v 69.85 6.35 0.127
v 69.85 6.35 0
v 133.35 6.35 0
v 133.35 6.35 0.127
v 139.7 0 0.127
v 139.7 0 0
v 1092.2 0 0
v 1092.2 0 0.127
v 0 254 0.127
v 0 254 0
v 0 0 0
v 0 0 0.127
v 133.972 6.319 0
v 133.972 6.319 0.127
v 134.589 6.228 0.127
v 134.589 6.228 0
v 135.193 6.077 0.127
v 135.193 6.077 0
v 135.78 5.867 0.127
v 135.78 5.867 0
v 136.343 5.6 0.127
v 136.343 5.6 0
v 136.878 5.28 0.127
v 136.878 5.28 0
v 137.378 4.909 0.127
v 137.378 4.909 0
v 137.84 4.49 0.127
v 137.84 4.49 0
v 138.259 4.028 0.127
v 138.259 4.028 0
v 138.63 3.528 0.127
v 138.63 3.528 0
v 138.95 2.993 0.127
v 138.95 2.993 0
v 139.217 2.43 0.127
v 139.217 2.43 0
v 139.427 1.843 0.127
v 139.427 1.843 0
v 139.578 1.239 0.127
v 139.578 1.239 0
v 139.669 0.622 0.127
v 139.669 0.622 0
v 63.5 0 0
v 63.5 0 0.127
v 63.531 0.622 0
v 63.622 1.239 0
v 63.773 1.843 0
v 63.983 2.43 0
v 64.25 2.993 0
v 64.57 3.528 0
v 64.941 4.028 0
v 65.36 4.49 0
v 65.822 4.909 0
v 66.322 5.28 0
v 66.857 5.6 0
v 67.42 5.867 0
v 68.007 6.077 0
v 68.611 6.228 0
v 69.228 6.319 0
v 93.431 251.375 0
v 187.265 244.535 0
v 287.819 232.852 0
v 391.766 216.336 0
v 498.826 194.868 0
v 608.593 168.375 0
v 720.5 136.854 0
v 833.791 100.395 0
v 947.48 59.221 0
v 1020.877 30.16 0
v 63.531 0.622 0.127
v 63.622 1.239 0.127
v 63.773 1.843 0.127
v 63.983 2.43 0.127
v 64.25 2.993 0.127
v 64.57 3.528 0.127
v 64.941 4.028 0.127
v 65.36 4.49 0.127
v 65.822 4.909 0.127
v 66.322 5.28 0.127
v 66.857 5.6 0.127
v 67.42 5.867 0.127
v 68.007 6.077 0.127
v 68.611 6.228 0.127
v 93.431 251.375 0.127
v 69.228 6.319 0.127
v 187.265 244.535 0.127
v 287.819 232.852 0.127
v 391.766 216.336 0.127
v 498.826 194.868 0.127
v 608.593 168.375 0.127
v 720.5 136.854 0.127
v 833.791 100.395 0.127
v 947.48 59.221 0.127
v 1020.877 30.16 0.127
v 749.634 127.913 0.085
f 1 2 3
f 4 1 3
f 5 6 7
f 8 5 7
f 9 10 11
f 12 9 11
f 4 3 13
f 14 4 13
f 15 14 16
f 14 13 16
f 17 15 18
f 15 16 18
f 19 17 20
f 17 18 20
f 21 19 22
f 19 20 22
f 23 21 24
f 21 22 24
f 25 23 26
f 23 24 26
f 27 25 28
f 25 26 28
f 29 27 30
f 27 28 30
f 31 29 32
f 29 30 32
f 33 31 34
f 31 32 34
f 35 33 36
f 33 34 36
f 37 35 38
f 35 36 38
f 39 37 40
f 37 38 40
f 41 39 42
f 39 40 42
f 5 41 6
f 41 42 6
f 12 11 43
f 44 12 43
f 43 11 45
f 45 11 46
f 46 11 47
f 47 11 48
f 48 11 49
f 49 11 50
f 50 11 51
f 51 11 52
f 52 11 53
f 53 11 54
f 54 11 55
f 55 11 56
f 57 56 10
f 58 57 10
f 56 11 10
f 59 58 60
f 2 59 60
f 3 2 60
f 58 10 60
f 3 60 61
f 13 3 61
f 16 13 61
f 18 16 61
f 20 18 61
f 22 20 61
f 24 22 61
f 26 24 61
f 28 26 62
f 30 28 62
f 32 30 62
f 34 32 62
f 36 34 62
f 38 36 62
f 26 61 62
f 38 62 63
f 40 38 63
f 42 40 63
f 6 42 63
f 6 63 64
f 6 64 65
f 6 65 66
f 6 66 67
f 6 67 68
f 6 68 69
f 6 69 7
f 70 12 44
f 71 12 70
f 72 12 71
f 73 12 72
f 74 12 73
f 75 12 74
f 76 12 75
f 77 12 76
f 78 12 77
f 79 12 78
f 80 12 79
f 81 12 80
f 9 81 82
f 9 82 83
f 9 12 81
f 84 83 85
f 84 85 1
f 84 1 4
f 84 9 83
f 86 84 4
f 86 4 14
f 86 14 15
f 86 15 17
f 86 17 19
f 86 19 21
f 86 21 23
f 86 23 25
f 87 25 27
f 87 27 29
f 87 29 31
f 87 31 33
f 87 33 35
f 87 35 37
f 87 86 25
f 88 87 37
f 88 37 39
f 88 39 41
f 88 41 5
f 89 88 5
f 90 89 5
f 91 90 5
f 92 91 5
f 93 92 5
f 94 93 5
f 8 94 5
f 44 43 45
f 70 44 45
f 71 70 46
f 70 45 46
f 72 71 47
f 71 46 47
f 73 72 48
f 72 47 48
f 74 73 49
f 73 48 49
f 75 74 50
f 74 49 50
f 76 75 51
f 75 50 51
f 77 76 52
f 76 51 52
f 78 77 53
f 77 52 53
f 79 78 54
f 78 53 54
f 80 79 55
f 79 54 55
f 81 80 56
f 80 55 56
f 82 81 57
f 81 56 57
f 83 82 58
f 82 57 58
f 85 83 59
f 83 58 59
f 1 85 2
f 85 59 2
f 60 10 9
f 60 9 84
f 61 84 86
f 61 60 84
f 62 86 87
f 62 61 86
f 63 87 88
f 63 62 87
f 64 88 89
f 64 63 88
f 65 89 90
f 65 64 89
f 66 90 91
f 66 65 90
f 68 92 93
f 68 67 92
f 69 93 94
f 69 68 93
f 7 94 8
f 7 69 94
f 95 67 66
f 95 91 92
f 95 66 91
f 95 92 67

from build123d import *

# Parameters (mm, degrees)
BOSS_EXTRUDE1_DEPTH = 0.127
CUT_EXTRUDE2_DEPTH  = 1.1270001


with BuildPart() as part:
    # Sketch1 → Boss-Extrude1 (new body)
    with BuildSketch(Plane.XY):
        with BuildLine():
            Line((0, 254), (0, 0))
            Line((0, 0), (1092.2, 0))
            add(Edge.make_bspline(
                [(0, 254), (376.513153864, 252.276375478), (770.285770075, 140.499670678), (1092.2, 0)],
                knots=[0, 0, 0, 0, 1, 1, 1, 1], degree=3))
        make_face()
    extrude(amount=BOSS_EXTRUDE1_DEPTH)

    # Sketch7 → Cut-Extrude2 (cut, through all)
    with BuildSketch(Plane(origin=(0, 0, 0), x_dir=(-1, 0, 0), z_dir=(0, 0, -1))):
        with BuildLine():
            Line((-133.35, 0), (-63.5, 0))
            ThreePointArc((-63.5, 0), (-65.359871939, 4.490128061), (-69.85, 6.35))
            Line((-69.85, 6.35), (-133.35, 6.35))
            ThreePointArc((-133.35, 6.35), (-137.840128061, 4.490128061), (-139.7, 0))
            Line((-139.7, 0), (-133.35, 0))
        make_face()
    extrude(amount=-CUT_EXTRUDE2_DEPTH, mode=Mode.SUBTRACT)


solid = part.part
